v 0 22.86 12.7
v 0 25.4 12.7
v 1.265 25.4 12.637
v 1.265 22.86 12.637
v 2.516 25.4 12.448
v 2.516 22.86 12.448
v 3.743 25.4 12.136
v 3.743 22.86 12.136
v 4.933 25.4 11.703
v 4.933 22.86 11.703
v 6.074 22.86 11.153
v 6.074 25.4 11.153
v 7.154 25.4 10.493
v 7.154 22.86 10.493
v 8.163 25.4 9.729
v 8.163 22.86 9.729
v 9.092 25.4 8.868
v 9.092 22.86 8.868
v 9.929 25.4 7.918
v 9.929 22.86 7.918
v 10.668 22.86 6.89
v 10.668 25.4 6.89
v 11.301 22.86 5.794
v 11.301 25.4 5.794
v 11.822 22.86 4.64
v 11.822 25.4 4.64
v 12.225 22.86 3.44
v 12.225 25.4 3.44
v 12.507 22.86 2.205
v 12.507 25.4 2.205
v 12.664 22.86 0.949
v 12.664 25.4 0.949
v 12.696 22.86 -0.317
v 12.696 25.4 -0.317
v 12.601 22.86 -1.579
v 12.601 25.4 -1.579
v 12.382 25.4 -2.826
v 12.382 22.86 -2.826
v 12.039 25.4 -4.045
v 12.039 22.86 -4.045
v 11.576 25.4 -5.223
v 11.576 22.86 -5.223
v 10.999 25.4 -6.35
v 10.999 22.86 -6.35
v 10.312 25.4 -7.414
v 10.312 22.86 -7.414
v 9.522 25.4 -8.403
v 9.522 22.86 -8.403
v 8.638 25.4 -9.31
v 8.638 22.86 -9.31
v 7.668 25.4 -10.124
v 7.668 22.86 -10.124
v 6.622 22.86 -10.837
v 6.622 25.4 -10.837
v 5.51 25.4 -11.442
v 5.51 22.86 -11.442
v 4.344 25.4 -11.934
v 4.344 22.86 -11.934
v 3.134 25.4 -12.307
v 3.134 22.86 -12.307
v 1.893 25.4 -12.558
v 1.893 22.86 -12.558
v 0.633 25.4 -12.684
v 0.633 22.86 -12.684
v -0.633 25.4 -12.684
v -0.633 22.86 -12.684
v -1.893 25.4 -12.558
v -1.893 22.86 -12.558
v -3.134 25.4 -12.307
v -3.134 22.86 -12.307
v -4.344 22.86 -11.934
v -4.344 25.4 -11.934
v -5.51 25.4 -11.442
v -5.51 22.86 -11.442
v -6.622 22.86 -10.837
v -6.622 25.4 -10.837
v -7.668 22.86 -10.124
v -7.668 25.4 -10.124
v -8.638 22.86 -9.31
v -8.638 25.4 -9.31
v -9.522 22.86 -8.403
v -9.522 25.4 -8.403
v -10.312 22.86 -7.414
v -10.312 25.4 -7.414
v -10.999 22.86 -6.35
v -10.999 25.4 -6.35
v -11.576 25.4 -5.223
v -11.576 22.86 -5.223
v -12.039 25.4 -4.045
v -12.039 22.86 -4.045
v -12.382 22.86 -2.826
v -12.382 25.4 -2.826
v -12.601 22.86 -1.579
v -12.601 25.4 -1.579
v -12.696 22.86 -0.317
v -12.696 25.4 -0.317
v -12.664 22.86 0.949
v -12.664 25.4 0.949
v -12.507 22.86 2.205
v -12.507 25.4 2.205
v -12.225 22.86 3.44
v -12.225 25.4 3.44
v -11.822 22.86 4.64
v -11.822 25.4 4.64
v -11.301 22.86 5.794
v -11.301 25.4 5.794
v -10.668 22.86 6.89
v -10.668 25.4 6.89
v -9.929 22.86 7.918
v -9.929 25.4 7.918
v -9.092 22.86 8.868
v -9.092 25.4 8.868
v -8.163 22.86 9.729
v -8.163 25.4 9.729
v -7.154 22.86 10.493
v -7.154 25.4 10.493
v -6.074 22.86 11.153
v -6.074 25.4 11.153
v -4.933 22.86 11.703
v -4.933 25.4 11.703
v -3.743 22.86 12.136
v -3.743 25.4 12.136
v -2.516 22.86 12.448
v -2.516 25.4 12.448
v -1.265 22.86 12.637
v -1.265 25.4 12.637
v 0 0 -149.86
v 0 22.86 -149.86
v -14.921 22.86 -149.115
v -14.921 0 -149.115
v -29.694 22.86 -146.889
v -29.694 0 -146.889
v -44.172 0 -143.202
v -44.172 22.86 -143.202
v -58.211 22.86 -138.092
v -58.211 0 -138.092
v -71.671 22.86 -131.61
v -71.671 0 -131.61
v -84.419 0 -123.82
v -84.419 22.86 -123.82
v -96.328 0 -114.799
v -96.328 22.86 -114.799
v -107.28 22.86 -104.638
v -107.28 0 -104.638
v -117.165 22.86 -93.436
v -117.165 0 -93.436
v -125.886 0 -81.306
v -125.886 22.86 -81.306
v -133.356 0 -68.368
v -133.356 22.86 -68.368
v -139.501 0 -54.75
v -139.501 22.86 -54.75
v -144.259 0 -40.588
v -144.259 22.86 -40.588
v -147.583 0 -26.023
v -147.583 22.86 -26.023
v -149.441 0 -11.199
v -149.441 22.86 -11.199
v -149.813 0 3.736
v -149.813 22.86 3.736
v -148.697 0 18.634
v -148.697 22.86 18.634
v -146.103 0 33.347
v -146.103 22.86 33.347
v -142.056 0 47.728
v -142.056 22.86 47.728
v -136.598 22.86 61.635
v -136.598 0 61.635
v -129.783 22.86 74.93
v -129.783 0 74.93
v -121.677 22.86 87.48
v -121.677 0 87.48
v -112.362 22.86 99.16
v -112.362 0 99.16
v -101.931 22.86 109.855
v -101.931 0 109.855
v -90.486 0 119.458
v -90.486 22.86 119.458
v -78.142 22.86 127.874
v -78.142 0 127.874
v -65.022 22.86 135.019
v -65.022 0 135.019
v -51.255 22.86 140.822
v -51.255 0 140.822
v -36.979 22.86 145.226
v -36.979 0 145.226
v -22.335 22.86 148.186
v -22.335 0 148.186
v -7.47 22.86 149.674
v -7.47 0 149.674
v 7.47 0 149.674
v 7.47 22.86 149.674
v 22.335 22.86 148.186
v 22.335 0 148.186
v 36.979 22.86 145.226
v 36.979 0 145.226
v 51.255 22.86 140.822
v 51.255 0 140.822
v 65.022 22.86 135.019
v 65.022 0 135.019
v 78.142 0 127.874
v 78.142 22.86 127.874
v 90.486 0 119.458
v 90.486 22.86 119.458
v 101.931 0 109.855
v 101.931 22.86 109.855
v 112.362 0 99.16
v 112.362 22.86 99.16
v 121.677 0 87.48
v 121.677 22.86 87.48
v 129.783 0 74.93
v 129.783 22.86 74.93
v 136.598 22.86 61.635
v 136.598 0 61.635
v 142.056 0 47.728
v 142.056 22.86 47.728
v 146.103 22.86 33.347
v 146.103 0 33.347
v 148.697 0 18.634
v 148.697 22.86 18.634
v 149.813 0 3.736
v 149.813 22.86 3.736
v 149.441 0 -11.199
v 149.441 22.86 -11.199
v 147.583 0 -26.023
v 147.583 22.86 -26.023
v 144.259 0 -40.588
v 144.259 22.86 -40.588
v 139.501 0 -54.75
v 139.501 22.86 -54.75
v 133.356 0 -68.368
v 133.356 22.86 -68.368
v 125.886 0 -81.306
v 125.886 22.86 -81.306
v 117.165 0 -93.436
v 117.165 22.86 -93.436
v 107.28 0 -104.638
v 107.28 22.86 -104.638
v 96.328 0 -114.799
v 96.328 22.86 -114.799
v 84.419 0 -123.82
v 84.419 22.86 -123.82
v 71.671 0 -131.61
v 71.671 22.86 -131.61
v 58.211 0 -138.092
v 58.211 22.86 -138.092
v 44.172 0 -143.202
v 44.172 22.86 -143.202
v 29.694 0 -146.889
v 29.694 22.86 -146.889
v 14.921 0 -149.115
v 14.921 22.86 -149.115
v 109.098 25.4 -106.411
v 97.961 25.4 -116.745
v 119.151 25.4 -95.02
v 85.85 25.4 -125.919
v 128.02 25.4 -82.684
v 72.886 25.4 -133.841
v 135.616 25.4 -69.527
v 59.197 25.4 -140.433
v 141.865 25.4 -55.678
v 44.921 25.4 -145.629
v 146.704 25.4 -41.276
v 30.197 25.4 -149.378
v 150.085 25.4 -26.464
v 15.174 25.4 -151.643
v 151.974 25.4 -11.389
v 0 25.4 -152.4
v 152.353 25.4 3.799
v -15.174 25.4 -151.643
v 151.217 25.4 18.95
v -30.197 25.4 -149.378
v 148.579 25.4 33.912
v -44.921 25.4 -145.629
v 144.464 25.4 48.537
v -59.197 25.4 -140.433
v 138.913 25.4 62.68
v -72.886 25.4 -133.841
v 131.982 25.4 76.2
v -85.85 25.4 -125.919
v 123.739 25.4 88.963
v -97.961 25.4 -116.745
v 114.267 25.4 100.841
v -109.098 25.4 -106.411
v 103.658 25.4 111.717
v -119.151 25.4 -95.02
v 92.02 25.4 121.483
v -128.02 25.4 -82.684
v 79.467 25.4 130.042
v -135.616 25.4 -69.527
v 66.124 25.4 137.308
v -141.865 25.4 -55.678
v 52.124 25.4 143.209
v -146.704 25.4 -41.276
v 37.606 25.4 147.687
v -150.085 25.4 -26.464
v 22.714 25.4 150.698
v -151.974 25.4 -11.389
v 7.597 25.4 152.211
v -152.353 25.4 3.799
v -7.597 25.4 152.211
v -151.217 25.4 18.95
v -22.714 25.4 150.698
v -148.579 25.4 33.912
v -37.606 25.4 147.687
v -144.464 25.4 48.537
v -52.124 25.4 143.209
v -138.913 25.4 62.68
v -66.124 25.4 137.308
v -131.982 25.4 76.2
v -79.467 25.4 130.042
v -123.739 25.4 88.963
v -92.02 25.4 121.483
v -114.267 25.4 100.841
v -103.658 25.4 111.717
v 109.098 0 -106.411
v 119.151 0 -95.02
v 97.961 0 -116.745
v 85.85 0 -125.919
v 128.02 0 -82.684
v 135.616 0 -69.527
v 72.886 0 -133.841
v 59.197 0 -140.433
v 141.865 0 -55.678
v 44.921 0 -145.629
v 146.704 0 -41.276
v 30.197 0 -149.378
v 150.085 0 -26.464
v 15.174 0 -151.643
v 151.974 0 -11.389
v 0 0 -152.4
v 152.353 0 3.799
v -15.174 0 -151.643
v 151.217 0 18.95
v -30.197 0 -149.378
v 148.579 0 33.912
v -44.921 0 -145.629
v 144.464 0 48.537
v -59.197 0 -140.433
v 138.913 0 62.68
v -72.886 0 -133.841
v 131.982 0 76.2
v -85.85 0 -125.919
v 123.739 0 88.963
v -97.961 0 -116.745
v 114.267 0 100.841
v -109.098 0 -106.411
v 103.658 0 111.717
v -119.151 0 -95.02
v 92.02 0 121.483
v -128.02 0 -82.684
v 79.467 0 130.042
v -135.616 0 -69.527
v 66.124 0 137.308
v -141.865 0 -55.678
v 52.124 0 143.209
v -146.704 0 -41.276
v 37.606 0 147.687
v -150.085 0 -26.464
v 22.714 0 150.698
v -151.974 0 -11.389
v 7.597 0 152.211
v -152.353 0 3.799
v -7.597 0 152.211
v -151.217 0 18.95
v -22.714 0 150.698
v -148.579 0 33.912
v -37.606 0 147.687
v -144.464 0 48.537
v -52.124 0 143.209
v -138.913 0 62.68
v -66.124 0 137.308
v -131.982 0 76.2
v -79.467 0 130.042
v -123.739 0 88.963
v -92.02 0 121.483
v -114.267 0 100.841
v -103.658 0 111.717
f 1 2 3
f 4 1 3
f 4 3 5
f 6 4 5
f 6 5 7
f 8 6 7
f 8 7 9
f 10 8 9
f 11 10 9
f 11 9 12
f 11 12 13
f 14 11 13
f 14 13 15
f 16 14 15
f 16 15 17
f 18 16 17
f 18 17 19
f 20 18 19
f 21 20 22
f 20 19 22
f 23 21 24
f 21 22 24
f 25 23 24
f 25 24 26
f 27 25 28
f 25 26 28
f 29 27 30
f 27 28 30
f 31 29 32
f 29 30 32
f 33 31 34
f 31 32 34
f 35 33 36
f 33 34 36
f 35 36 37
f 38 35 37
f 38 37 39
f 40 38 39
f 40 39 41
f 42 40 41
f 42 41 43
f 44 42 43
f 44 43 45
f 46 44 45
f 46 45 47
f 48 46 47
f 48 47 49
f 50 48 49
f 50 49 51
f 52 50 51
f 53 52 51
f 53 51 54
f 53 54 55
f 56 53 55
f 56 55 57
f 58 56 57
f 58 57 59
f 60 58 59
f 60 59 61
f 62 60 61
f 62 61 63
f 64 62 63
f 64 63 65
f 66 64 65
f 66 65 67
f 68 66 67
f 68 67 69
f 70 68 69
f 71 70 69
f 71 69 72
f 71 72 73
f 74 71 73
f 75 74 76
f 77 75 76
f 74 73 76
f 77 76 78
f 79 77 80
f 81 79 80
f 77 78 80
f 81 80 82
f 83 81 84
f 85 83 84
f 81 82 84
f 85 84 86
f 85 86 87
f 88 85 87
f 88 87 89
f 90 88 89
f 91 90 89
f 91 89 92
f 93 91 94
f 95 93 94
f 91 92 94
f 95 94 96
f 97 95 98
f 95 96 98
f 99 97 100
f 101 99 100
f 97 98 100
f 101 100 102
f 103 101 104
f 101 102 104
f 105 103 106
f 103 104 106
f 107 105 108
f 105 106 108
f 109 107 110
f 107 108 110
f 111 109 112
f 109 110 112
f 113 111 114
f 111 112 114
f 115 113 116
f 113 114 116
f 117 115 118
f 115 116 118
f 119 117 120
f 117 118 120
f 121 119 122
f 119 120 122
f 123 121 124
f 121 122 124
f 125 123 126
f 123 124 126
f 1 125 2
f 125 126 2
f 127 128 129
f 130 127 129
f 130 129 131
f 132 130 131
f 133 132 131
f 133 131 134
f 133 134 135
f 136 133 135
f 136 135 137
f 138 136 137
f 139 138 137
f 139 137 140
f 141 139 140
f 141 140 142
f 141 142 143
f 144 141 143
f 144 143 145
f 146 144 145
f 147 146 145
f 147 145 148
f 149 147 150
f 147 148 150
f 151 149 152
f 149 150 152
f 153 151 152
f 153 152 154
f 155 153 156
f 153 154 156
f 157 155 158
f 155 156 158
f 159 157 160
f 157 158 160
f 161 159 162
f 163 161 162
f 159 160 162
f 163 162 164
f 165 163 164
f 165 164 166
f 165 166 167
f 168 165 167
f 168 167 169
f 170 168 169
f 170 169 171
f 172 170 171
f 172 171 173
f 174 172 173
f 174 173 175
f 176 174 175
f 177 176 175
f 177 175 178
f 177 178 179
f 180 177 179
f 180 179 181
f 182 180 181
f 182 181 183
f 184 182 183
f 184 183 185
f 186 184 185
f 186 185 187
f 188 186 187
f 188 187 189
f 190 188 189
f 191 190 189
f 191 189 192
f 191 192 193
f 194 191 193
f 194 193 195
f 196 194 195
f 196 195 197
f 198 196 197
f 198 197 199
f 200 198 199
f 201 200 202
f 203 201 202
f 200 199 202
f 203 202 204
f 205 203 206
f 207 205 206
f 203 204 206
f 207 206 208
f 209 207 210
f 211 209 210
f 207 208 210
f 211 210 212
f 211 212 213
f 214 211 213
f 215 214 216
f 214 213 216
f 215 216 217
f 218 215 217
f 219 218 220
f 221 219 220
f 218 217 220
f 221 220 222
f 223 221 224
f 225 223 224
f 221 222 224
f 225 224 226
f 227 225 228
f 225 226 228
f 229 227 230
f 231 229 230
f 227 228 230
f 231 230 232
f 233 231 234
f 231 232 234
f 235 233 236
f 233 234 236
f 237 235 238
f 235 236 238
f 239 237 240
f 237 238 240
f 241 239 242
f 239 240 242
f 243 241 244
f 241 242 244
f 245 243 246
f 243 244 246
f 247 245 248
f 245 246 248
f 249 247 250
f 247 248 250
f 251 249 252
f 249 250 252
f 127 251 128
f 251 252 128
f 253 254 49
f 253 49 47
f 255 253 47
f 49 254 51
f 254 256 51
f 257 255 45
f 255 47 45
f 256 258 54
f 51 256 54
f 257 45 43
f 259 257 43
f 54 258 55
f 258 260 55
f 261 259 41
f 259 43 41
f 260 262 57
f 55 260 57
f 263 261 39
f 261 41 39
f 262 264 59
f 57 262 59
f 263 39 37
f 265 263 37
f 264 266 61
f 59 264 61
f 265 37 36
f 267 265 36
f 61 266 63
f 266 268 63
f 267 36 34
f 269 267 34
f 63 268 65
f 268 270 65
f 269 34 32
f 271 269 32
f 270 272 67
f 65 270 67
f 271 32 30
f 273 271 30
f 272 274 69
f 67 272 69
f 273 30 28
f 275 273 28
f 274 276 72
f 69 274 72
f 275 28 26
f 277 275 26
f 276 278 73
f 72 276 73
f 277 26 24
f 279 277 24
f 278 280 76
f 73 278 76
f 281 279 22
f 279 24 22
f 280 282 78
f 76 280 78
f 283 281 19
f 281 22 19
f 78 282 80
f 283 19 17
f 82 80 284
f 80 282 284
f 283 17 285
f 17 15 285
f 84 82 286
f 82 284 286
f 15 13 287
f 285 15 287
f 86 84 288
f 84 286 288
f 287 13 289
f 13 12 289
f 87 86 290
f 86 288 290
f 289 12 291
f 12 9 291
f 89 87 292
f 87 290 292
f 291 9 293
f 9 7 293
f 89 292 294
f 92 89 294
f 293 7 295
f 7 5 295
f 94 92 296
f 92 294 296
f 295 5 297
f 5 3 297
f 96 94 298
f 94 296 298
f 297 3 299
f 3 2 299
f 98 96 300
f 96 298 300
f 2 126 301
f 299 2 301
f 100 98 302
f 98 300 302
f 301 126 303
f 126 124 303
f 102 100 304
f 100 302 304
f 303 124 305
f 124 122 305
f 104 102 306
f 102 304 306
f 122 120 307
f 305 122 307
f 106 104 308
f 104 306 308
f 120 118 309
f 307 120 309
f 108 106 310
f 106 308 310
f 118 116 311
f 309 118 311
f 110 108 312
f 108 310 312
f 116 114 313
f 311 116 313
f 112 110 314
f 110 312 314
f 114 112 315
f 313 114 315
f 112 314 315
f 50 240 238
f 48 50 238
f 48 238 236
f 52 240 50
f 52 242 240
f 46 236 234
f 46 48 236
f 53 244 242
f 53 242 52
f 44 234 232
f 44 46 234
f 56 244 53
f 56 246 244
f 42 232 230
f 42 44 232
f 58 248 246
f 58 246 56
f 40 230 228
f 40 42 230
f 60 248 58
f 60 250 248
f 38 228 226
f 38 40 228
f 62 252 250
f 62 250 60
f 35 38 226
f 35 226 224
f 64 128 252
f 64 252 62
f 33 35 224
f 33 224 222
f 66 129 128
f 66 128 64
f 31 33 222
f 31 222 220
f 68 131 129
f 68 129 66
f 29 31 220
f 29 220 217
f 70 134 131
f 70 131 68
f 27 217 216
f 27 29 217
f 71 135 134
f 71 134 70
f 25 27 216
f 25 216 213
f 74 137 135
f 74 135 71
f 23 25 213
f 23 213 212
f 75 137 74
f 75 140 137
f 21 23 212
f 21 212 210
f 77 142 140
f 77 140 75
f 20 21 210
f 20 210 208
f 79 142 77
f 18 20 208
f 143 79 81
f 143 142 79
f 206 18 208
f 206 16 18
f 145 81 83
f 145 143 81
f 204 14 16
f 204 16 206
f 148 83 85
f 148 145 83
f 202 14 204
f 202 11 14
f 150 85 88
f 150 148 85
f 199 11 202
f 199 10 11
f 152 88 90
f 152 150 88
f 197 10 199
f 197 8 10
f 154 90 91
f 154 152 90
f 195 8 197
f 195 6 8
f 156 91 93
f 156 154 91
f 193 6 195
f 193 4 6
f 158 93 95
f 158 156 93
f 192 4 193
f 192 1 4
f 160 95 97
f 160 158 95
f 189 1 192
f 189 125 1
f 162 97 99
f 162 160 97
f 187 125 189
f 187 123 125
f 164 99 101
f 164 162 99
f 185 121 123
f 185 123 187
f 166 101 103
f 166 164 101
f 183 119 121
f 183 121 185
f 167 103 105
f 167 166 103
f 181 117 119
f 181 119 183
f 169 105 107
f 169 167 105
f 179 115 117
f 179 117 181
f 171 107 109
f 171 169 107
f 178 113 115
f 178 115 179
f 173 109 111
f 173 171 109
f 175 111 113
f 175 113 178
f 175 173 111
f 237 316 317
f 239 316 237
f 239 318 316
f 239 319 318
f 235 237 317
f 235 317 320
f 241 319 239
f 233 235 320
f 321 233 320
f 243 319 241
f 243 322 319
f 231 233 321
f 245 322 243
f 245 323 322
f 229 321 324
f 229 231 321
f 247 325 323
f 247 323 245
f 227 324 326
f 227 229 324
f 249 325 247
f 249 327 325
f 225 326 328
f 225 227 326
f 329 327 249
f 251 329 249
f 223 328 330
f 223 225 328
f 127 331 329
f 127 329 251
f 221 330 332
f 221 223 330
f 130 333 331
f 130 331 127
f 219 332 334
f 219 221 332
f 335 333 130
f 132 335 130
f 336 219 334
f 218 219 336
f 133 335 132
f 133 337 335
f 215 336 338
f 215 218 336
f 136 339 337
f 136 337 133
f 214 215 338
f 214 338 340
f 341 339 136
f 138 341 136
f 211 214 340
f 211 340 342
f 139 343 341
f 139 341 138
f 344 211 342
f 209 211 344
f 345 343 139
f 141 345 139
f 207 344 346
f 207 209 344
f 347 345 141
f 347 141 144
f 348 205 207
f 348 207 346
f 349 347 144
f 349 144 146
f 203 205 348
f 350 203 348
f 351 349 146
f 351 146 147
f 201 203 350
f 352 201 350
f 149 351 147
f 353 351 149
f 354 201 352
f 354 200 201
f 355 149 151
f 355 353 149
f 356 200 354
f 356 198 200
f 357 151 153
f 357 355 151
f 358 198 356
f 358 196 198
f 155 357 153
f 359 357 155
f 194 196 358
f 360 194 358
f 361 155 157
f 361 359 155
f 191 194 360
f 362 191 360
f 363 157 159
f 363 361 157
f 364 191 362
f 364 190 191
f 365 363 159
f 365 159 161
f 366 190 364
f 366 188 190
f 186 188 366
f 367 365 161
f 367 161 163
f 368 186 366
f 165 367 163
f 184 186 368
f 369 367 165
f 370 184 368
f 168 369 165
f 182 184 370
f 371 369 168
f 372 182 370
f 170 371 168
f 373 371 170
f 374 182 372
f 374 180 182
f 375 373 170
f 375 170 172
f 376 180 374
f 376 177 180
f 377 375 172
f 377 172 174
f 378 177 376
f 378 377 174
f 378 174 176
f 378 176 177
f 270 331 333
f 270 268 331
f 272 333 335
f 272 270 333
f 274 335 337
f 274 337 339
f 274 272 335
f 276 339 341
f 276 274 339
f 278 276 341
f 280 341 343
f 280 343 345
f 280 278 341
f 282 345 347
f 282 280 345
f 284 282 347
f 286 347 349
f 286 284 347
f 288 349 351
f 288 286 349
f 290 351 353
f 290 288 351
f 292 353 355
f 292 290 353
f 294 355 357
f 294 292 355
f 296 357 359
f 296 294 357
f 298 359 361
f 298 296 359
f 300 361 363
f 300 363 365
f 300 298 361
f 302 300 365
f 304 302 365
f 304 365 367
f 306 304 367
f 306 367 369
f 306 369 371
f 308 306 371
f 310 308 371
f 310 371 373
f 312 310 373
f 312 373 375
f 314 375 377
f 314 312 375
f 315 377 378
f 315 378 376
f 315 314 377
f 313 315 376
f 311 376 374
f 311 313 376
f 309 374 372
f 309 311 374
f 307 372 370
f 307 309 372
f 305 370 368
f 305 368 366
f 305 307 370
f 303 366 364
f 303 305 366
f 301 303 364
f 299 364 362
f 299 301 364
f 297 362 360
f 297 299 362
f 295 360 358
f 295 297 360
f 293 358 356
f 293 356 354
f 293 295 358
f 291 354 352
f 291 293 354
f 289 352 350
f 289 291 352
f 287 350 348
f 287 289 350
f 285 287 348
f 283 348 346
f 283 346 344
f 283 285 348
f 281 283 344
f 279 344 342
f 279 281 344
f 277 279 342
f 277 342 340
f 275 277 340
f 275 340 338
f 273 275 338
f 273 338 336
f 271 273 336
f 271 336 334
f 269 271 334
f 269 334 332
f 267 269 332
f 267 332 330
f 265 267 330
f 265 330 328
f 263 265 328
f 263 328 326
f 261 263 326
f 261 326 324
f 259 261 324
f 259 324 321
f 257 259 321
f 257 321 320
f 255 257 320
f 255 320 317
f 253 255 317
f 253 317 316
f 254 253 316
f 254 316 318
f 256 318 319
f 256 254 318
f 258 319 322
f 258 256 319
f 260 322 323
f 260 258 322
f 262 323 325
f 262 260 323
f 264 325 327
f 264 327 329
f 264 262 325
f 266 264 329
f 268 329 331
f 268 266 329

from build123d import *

# Parameters (mm, degrees)
SKETCH1_W          = 152.4
SKETCH1_H          = 25.4
SHELL2_T           = -2.54
SKETCH2_R          = 12.7
CUT_EXTRUDE1_DEPTH = 218.017695131


with BuildPart() as part:
    # Sketch1 → Revolve1 (revolve)
    with BuildSketch(Plane.XY, mode=Mode.PRIVATE) as revolve1_sk:
        with Locations((76.2, 12.7)):
            Rectangle(SKETCH1_W, SKETCH1_H)
    revolve(revolve1_sk.sketch.rotate(Axis((0, 0, 0), (0, 1, 0)), 90), axis=Axis((0, 0, 0), (0, 1, 0)))

    # Shell2
    shell2_openings = [part.faces().sort_by_distance(p)[0] for p in [
        (0, 0, 0),
    ]]
    offset(amount=SHELL2_T, openings=shell2_openings, kind=Kind.INTERSECTION)

    # Sketch2 → Cut-Extrude1 (cut, through all)
    with BuildSketch(Plane(origin=(0, 25.4, 0), x_dir=(1, 0, 0), z_dir=(0, 1, 0))):
        with Locations(Location((0, 0, 0), (0, 0, 270))):
            Circle(SKETCH2_R)
    extrude(amount=-CUT_EXTRUDE1_DEPTH, mode=Mode.SUBTRACT)


solid = part.part
